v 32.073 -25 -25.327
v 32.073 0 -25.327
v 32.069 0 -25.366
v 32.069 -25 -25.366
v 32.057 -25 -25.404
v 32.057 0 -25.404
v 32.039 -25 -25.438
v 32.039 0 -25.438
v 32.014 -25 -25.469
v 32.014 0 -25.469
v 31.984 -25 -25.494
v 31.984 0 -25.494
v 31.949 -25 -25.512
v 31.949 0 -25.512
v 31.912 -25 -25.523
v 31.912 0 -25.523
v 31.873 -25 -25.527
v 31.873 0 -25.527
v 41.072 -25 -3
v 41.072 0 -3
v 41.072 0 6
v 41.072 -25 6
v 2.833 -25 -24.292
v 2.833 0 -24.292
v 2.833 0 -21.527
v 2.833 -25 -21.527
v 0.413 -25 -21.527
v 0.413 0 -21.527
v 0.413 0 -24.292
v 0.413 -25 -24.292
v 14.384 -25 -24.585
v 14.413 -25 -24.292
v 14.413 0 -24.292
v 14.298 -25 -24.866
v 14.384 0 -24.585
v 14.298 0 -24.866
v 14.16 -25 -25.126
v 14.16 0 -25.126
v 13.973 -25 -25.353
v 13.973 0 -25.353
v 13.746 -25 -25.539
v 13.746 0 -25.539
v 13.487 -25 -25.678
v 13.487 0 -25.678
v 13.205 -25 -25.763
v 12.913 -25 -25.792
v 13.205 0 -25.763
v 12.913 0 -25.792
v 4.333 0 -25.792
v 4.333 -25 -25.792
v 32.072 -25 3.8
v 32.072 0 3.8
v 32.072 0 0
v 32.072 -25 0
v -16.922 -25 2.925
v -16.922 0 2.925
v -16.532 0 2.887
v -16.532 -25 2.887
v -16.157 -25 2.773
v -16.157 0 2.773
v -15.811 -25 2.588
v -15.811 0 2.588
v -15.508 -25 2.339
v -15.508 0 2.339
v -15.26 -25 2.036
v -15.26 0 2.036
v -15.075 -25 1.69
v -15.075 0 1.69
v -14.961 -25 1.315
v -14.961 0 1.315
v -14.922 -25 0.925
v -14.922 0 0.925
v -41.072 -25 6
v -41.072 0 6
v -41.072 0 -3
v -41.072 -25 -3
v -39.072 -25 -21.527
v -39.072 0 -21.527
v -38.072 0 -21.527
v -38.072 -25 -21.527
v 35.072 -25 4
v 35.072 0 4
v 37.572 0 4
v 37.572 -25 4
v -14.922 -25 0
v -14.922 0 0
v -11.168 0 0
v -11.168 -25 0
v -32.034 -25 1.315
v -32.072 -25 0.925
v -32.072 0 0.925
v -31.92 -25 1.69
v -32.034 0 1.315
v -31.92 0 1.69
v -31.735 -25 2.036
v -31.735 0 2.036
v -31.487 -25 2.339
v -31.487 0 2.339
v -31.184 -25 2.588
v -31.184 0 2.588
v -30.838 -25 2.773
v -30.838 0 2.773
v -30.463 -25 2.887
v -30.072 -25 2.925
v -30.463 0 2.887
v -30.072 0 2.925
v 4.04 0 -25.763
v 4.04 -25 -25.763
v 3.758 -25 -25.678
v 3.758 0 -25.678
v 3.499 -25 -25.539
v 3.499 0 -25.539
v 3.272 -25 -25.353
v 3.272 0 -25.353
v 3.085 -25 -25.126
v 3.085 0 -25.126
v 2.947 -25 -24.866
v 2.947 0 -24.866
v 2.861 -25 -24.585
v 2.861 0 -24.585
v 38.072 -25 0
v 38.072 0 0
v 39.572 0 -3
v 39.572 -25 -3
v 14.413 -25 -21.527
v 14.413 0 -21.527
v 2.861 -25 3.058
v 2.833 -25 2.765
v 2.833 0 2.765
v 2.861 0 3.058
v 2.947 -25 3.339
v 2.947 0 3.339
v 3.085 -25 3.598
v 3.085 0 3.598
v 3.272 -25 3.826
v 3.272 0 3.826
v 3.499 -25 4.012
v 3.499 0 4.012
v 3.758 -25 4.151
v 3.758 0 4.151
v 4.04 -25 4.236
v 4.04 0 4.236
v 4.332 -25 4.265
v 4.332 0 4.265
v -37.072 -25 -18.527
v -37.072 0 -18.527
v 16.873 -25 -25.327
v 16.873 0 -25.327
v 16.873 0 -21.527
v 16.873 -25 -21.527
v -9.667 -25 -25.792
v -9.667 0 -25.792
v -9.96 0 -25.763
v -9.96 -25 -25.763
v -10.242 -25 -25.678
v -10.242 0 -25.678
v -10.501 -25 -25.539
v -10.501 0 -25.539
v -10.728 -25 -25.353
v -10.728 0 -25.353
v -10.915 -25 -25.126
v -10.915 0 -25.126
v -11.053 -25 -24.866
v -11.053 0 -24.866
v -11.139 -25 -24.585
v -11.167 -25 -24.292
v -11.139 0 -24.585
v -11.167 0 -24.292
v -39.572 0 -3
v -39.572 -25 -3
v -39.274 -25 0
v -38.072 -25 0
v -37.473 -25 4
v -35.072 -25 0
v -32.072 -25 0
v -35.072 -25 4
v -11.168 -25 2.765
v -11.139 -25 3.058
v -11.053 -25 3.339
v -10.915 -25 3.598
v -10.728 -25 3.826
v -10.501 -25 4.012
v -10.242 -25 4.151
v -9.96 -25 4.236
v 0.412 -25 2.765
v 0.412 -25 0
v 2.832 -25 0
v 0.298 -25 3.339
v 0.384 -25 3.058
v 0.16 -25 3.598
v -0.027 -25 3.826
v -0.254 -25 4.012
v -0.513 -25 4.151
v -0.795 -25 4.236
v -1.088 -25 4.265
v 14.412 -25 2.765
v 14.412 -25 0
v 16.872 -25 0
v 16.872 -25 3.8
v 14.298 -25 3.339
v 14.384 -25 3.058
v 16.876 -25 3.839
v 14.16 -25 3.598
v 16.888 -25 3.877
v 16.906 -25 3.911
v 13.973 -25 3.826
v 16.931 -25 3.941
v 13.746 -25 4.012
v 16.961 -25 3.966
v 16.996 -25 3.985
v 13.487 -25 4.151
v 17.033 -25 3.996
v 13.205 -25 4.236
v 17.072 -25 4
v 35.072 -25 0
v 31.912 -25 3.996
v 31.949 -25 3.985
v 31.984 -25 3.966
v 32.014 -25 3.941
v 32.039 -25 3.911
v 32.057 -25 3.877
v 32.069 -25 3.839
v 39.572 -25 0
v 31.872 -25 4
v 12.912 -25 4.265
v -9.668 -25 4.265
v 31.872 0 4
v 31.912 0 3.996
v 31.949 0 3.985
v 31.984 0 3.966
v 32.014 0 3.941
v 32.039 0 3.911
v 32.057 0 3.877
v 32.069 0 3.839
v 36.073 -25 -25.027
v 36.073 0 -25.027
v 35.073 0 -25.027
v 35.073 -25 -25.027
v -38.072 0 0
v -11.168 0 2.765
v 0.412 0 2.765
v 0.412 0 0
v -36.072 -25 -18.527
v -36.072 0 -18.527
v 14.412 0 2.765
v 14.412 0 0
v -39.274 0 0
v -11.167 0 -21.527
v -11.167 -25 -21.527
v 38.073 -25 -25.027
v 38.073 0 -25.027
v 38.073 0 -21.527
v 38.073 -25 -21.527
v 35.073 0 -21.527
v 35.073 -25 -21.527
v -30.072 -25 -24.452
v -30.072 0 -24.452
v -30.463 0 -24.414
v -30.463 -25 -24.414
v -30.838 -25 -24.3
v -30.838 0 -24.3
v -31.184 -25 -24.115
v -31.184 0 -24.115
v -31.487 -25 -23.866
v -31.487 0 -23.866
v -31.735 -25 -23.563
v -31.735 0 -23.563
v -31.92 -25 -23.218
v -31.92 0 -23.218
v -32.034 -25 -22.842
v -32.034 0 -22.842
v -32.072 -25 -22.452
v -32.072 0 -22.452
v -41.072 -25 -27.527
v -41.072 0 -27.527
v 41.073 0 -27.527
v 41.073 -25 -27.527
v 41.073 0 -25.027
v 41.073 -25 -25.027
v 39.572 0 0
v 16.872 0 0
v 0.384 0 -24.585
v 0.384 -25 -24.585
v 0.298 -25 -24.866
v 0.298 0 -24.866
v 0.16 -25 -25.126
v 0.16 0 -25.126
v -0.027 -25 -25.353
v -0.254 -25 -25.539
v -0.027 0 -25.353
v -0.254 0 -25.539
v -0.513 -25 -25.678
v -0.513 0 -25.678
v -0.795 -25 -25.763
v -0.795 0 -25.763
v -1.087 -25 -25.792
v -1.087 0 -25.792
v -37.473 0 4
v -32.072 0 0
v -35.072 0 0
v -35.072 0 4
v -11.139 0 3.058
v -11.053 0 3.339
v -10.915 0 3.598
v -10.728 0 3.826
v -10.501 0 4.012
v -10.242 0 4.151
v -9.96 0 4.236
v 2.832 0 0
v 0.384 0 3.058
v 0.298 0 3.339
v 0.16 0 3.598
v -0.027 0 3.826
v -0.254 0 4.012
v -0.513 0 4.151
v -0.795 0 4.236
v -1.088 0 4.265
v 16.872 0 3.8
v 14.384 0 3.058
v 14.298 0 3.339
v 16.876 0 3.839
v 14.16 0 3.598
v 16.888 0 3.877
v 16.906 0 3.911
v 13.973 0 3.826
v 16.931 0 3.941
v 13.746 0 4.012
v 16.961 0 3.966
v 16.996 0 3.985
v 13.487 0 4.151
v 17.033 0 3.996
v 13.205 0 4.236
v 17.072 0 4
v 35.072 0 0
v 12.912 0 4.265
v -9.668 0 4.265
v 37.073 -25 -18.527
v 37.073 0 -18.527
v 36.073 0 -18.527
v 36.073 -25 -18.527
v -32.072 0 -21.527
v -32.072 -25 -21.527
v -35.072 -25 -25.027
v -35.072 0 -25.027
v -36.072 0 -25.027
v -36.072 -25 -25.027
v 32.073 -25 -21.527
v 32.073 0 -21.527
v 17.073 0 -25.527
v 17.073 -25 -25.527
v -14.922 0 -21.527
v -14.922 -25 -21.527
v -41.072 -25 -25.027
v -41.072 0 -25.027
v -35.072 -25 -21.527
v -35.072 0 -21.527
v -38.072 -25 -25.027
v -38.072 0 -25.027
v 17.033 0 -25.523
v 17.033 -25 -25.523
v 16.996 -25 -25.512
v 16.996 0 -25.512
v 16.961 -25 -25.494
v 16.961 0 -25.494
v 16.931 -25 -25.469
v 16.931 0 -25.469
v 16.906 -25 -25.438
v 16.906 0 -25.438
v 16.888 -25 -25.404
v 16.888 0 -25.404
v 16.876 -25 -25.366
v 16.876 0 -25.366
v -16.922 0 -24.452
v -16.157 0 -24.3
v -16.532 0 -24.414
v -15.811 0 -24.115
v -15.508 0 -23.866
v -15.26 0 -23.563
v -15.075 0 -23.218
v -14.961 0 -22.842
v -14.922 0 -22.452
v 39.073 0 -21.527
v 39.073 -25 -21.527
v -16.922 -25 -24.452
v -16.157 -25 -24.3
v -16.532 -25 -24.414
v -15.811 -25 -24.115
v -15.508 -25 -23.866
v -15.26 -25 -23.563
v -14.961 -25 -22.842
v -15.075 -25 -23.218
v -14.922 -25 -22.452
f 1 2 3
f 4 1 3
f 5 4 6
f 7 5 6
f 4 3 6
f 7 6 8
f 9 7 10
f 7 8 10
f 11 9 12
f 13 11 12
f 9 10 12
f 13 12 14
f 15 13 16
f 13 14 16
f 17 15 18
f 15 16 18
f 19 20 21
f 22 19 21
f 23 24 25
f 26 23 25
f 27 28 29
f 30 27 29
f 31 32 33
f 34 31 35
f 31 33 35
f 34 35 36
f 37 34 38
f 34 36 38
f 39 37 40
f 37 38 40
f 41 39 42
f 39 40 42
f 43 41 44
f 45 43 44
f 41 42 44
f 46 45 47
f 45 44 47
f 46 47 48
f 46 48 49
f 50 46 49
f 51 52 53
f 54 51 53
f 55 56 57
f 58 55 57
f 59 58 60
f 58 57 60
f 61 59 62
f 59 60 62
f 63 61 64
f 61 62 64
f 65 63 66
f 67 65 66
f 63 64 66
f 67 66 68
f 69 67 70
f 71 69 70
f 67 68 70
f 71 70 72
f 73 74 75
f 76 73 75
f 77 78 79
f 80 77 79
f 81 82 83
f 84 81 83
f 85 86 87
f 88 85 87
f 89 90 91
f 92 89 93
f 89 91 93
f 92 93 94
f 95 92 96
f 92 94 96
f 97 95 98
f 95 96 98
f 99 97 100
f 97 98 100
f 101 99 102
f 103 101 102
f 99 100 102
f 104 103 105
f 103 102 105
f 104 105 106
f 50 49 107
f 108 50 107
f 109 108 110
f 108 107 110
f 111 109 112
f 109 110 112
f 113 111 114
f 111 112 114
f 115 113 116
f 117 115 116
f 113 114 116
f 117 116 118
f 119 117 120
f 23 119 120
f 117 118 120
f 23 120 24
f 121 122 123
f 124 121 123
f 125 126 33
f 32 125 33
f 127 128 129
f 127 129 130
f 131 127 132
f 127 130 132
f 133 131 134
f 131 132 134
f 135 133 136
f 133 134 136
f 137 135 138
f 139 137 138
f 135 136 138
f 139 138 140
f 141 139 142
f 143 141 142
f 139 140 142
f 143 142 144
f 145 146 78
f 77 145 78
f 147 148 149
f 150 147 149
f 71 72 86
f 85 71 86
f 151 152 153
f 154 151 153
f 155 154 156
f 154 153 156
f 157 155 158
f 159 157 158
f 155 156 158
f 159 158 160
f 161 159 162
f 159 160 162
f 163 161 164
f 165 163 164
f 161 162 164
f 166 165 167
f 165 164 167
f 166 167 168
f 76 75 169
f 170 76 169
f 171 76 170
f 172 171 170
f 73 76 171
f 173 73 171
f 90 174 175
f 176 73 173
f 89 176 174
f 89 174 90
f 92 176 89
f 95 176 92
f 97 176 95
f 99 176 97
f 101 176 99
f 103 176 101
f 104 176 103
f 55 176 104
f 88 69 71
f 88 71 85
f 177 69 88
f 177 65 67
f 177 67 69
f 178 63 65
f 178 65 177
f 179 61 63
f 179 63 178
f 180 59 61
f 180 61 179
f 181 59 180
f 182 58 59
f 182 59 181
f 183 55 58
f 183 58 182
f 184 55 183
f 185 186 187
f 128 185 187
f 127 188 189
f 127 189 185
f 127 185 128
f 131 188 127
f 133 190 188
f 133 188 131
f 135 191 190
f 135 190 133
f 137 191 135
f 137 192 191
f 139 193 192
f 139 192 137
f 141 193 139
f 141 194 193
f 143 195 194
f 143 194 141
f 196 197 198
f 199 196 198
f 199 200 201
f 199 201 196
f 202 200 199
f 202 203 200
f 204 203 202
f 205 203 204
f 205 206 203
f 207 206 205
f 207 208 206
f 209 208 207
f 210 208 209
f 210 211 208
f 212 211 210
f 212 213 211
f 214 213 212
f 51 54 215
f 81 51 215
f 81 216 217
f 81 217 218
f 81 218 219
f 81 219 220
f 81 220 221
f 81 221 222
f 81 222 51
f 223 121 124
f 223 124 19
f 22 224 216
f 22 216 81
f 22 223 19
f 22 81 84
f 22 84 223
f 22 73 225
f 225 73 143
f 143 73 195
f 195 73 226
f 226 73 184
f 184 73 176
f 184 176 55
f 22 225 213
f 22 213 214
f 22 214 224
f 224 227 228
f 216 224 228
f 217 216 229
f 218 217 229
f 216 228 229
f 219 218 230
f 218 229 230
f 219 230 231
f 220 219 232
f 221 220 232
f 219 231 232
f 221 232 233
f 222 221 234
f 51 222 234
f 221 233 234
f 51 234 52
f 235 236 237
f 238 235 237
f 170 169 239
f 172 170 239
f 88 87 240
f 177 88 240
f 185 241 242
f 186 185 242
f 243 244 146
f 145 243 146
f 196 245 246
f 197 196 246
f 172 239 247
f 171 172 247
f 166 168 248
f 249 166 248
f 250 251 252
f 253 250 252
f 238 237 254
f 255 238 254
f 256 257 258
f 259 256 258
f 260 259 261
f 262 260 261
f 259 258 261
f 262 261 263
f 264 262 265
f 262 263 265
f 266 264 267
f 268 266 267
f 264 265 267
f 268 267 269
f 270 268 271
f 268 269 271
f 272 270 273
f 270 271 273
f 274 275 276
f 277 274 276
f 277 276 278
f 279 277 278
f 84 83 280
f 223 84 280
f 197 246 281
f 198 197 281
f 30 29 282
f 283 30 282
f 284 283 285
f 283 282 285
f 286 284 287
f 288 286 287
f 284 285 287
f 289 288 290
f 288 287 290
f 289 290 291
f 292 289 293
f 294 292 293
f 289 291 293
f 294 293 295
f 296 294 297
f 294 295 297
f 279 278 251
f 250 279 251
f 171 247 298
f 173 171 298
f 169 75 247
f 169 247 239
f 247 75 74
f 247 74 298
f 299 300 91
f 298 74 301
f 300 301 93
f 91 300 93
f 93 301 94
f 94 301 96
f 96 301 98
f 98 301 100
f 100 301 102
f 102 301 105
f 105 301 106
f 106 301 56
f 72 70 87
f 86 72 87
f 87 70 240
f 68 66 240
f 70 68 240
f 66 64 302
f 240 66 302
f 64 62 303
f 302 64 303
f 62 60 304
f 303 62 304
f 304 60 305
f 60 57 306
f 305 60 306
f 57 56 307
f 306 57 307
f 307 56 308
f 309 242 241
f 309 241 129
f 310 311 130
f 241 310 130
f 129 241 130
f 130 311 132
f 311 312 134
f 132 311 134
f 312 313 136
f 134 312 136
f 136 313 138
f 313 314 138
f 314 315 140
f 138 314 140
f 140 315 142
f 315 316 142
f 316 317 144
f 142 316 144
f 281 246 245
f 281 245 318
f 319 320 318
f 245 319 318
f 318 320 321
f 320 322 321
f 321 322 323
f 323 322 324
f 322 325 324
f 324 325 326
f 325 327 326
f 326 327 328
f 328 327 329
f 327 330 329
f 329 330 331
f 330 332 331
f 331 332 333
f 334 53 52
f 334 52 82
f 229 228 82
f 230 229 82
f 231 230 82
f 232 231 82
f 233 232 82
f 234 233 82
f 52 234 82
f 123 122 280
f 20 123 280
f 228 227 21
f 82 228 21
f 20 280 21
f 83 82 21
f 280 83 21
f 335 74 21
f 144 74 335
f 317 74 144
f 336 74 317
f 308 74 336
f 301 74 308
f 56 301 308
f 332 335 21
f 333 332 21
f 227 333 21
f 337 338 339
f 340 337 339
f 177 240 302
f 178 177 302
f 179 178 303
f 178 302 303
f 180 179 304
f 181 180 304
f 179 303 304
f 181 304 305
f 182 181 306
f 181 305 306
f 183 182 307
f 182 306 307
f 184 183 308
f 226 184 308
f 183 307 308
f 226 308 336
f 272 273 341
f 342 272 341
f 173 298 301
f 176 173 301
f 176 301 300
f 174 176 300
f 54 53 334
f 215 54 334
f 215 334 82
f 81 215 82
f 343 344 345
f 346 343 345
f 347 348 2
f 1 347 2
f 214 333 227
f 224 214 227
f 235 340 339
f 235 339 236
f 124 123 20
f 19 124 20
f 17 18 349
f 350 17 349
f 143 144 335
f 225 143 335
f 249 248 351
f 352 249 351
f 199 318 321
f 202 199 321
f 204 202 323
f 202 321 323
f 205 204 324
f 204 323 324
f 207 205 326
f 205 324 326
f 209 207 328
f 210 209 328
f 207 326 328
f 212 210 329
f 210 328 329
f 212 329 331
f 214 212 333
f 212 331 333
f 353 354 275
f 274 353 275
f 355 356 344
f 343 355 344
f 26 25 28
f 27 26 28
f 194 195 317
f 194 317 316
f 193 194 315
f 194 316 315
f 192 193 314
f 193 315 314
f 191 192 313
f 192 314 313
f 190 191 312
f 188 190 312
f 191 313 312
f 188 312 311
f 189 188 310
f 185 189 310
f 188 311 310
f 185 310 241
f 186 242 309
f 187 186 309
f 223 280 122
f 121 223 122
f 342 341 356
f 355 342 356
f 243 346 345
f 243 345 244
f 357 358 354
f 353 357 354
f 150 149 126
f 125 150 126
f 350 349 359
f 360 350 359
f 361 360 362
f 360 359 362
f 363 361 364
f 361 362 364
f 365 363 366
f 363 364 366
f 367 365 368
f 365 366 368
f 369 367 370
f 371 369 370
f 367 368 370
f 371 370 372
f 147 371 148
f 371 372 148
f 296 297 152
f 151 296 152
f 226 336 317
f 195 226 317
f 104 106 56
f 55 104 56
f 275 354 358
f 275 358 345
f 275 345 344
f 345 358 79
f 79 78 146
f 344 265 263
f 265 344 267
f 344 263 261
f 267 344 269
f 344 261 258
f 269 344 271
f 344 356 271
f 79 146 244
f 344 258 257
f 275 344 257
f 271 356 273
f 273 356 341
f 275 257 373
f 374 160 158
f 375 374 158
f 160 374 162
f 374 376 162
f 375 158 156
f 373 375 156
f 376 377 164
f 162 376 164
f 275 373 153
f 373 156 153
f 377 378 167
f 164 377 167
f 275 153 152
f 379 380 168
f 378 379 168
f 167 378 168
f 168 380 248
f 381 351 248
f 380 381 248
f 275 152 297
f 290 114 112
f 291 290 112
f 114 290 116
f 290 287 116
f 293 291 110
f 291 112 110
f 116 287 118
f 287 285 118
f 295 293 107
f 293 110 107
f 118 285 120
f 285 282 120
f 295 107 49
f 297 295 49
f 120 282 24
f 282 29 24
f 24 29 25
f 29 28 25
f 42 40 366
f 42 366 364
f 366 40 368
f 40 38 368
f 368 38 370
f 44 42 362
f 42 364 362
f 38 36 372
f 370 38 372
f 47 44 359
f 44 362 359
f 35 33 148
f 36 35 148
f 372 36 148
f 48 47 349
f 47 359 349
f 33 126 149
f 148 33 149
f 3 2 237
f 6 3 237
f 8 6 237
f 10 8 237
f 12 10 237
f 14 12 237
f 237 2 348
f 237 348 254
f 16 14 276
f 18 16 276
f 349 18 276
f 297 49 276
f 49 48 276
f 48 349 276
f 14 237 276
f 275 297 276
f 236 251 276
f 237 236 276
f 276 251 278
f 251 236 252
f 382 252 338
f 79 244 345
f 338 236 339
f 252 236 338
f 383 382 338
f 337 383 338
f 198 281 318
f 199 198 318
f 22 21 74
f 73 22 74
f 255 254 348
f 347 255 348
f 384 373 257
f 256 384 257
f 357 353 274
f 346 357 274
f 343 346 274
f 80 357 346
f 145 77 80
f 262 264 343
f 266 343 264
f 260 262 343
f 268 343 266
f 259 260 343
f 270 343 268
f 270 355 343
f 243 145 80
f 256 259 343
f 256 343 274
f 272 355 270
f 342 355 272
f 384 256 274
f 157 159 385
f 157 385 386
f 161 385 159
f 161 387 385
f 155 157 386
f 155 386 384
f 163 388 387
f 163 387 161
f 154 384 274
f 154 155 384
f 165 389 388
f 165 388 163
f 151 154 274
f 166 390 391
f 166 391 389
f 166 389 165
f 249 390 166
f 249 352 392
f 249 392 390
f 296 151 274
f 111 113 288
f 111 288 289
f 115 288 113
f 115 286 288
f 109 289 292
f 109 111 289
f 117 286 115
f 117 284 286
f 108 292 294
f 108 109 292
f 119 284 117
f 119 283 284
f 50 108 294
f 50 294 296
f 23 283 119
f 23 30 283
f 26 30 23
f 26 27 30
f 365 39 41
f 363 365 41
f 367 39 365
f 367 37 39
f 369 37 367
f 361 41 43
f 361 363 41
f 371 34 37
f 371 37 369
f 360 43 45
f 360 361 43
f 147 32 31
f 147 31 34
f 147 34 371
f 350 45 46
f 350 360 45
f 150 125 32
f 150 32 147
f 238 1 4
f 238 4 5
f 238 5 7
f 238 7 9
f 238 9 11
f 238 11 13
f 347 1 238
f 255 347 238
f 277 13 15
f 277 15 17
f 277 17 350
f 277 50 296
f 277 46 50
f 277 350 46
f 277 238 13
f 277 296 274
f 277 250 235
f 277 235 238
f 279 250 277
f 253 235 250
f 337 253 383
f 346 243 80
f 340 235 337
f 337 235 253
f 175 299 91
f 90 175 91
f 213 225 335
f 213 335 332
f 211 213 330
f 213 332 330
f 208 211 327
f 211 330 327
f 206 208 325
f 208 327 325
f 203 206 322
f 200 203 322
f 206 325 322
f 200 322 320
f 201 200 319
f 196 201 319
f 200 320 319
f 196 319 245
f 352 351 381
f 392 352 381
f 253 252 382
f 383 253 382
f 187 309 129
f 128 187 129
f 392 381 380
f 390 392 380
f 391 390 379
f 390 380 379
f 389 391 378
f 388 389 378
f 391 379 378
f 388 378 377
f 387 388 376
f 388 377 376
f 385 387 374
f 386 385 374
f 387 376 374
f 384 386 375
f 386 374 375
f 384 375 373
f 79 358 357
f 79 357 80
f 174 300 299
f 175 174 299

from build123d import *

# Parameters (mm, degrees)
F1_DEPTH = 25
F0_W     = 2
F0_H     = 2.5
F0_H_2   = 3.5
F2_DEPTH = 25


with BuildPart() as f1:
    # F0 (on Front) → F1 (new body)
    with BuildSketch(Plane.XZ):
        Polygon((-41.0725, 6), (-41.0725, 0), (-39.2735674977, 0), (-37.4728558326, 4), (-36.5725, 6), align=None)
        Polygon((-37.4728558326, 4), (-35.0725, 4), (-35.0725, 4.5), (-35.0725, 6), (-36.5725, 6), align=None)
        with BuildLine():
            Line((32.0725, 0), (35.0725, 0))
            Line((35.0725, 0), (35.0725, 4))
            Line((35.0725, 4), (35.0725, 4.5))
            Line((35.0725, 4.5), (35.0725, 6))
            Line((35.0725, 6), (33.5725, 6))
            Line((33.5725, 6), (-33.5725, 6))
            Line((-33.5725, 6), (-35.0725, 6))
            Line((-35.0725, 6), (-35.0725, 4.5))
            Line((-35.0725, 4.5), (-35.0725, 4))
            Line((-35.0725, 4), (-35.0725, 0))
            Line((-35.0725, 0), (-32.0725, 0))
            Line((-32.0725, 0), (-32.0725, 0.925))
            ThreePointArc((-32.0725, 0.925), (-31.4867135624, 2.3392135624), (-30.0725, 2.925))
            Line((-30.0725, 2.925), (-16.9225, 2.925))
            ThreePointArc((-16.9225, 2.925), (-15.5082864376, 2.3392135624), (-14.9225, 0.925))
            Line((-14.9225, 0.925), (-14.9225, 0))
            Line((-14.9225, 0), (-11.1675, 0))
            Line((-11.1675, 0), (-11.1675, 2.765))
            ThreePointArc((-11.1675, 2.765), (-10.7281601718, 3.8256601718), (-9.6675, 4.265))
            Line((-9.6675, 4.265), (-1.0875, 4.265))
            ThreePointArc((-1.0875, 4.265), (-0.0268398282, 3.8256601718), (0.4125, 2.765))
            Line((0.4125, 2.765), (0.4125, 0))
            Line((0.4125, 0), (2.8325, 0))
            Line((2.8325, 0), (2.8325, 2.765))
            ThreePointArc((2.8325, 2.765), (3.2718398282, 3.8256601718), (4.3325, 4.265))
            Line((4.3325, 4.265), (12.9125, 4.265))
            ThreePointArc((12.9125, 4.265), (13.9731601718, 3.8256601718), (14.4125, 2.765))
            Line((14.4125, 2.765), (14.4125, 0))
            Line((14.4125, 0), (16.8725, 0))
            Line((16.8725, 0), (16.8725, 3.8))
            ThreePointArc((16.8725, 3.8), (16.9310786438, 3.9414213562), (17.0725, 4))
            Line((17.0725, 4), (31.8725, 4))
            ThreePointArc((31.8725, 4), (32.0139213562, 3.9414213562), (32.0725, 3.8))
            Line((32.0725, 3.8), (32.0725, 0))
        make_face()
        Polygon((35.0725, 4.5), (35.0725, 4), (37.5725, 4), (36.5725, 6), (35.0725, 6), align=None)
        Polygon((39.5725, 0), (41.0725, 0), (41.0725, 6), (36.5725, 6), (37.5725, 4), align=None)
        Polygon((39.5725, -3), (41.0725, -3), (41.0725, 0), (39.5725, 0), (38.0725, 0), align=None)
        Polygon((-41.0725, 0), (-41.0725, -3), (-39.5725, -3), (-38.0725, 0), (-39.2735674977, 0), align=None)
    extrude(amount=F1_DEPTH)


with BuildPart() as f2:
    # F0 (on Front) → F2 (new body)
    with BuildSketch(Plane.XZ):
        with BuildLine():
            Line((-33.572499007, -27.5272362262), (33.572500993, -27.5272362262))
            Line((33.572500993, -27.5272362262), (35.072500993, -27.5272362262))
            Line((35.072500993, -27.5272362262), (35.072500993, -26.0272362262))
            Line((35.072500993, -26.0272362262), (35.072500993, -25.0272362262))
            Line((35.072500993, -25.0272362262), (35.072500993, -21.5272362262))
            Line((35.072500993, -21.5272362262), (32.072500993, -21.5272362262))
            Line((32.072500993, -21.5272362262), (32.072500993, -25.3272362262))
            ThreePointArc((32.072500993, -25.3272362262), (32.0139223493, -25.4686575824), (31.872500993, -25.5272362262))
            Line((31.872500993, -25.5272362262), (17.072500993, -25.5272362262))
            ThreePointArc((17.072500993, -25.5272362262), (16.9310796368, -25.4686575824), (16.872500993, -25.3272362262))
            Line((16.872500993, -25.3272362262), (16.872500993, -21.5272362262))
            Line((16.872500993, -21.5272362262), (14.412500993, -21.5272362262))
            Line((14.412500993, -21.5272362262), (14.412500993, -24.2922362262))
            ThreePointArc((14.412500993, -24.2922362262), (13.9731611648, -25.352896398), (12.912500993, -25.7922362262))
            Line((12.912500993, -25.7922362262), (4.332500993, -25.7922362262))
            ThreePointArc((4.332500993, -25.7922362262), (3.2718408212, -25.352896398), (2.832500993, -24.2922362262))
            Line((2.832500993, -24.2922362262), (2.832500993, -21.5272362262))
            Line((2.832500993, -21.5272362262), (0.412500993, -21.5272362262))
            Line((0.412500993, -21.5272362262), (0.412500993, -24.2922362262))
            ThreePointArc((0.412500993, -24.2922362262), (-0.0268388352, -25.352896398), (-1.087499007, -25.7922362262))
            Line((-1.087499007, -25.7922362262), (-9.667499007, -25.7922362262))
            ThreePointArc((-9.667499007, -25.7922362262), (-10.7281591788, -25.352896398), (-11.167499007, -24.2922362262))
            Line((-11.167499007, -24.2922362262), (-11.167499007, -21.5272362262))
            Line((-11.167499007, -21.5272362262), (-14.922499007, -21.5272362262))
            Line((-14.922499007, -21.5272362262), (-14.922499007, -22.4522362262))
            ThreePointArc((-14.922499007, -22.4522362262), (-15.5082854446, -23.8664497886), (-16.922499007, -24.4522362262))
            Line((-16.922499007, -24.4522362262), (-30.072499007, -24.4522362262))
            ThreePointArc((-30.072499007, -24.4522362262), (-31.4867125694, -23.8664497886), (-32.072499007, -22.4522362262))
            Line((-32.072499007, -22.4522362262), (-32.072499007, -21.5272362262))
            Line((-32.072499007, -21.5272362262), (-35.072499007, -21.5272362262))
            Line((-35.072499007, -21.5272362262), (-35.072499007, -25.0272362262))
            Line((-35.072499007, -25.0272362262), (-35.072499007, -26.0272362262))
            Line((-35.072499007, -26.0272362262), (-35.072499007, -27.5272362262))
            Line((-35.072499007, -27.5272362262), (-33.572499007, -27.5272362262))
        make_face()
        Polygon((35.072500993, -26.0272362262), (35.072500993, -27.5272362262), (36.072500993, -27.5272362262), (36.072500993, -25.0272362262), (35.072500993, -25.0272362262), align=None)
        Polygon((-36.072499007, -27.5272362262), (-35.072499007, -27.5272362262), (-35.072499007, -26.0272362262), (-35.072499007, -25.0272362262), (-36.072499007, -25.0272362262), align=None)
        with Locations((37.072500993, -26.2772362262)):
            Rectangle(F0_W, F0_H)
        with Locations((-37.072499007, -26.2772362262)):
            Rectangle(F0_W, F0_H)
        Polygon((38.072500993, -25.0272362262), (38.072500993, -27.5272362262), (41.072500993, -27.5272362262), (39.822500993, -25.0272362262), align=None)
        with Locations((37.072500993, -23.2772362262)):
            Rectangle(F0_W, F0_H_2)
        Polygon((-41.072499007, -27.5272362262), (-38.072499007, -27.5272362262), (-38.072499007, -25.0272362262), (-39.822499007, -25.0272362262), align=None)
        with Locations((-37.072499007, -23.2772362262)):
            Rectangle(F0_W, F0_H_2)
        Polygon((39.822500993, -25.0272362262), (41.072500993, -27.5272362262), (41.072500993, -25.0272362262), align=None)
        Polygon((36.072500993, -18.5272362262), (36.072500993, -21.5272362262), (38.072500993, -21.5272362262), (39.072500993, -21.5272362262), (37.072500993, -18.5272362262), align=None)
        Polygon((-41.072499007, -25.0272362262), (-41.072499007, -27.5272362262), (-39.822499007, -25.0272362262), align=None)
        Polygon((-38.072499007, -21.5272362262), (-36.072499007, -21.5272362262), (-36.072499007, -18.5272362262), (-37.072499007, -18.5272362262), (-39.072499007, -21.5272362262), align=None)
    extrude(amount=F2_DEPTH)


solid = Compound([f1.part, f2.part])
